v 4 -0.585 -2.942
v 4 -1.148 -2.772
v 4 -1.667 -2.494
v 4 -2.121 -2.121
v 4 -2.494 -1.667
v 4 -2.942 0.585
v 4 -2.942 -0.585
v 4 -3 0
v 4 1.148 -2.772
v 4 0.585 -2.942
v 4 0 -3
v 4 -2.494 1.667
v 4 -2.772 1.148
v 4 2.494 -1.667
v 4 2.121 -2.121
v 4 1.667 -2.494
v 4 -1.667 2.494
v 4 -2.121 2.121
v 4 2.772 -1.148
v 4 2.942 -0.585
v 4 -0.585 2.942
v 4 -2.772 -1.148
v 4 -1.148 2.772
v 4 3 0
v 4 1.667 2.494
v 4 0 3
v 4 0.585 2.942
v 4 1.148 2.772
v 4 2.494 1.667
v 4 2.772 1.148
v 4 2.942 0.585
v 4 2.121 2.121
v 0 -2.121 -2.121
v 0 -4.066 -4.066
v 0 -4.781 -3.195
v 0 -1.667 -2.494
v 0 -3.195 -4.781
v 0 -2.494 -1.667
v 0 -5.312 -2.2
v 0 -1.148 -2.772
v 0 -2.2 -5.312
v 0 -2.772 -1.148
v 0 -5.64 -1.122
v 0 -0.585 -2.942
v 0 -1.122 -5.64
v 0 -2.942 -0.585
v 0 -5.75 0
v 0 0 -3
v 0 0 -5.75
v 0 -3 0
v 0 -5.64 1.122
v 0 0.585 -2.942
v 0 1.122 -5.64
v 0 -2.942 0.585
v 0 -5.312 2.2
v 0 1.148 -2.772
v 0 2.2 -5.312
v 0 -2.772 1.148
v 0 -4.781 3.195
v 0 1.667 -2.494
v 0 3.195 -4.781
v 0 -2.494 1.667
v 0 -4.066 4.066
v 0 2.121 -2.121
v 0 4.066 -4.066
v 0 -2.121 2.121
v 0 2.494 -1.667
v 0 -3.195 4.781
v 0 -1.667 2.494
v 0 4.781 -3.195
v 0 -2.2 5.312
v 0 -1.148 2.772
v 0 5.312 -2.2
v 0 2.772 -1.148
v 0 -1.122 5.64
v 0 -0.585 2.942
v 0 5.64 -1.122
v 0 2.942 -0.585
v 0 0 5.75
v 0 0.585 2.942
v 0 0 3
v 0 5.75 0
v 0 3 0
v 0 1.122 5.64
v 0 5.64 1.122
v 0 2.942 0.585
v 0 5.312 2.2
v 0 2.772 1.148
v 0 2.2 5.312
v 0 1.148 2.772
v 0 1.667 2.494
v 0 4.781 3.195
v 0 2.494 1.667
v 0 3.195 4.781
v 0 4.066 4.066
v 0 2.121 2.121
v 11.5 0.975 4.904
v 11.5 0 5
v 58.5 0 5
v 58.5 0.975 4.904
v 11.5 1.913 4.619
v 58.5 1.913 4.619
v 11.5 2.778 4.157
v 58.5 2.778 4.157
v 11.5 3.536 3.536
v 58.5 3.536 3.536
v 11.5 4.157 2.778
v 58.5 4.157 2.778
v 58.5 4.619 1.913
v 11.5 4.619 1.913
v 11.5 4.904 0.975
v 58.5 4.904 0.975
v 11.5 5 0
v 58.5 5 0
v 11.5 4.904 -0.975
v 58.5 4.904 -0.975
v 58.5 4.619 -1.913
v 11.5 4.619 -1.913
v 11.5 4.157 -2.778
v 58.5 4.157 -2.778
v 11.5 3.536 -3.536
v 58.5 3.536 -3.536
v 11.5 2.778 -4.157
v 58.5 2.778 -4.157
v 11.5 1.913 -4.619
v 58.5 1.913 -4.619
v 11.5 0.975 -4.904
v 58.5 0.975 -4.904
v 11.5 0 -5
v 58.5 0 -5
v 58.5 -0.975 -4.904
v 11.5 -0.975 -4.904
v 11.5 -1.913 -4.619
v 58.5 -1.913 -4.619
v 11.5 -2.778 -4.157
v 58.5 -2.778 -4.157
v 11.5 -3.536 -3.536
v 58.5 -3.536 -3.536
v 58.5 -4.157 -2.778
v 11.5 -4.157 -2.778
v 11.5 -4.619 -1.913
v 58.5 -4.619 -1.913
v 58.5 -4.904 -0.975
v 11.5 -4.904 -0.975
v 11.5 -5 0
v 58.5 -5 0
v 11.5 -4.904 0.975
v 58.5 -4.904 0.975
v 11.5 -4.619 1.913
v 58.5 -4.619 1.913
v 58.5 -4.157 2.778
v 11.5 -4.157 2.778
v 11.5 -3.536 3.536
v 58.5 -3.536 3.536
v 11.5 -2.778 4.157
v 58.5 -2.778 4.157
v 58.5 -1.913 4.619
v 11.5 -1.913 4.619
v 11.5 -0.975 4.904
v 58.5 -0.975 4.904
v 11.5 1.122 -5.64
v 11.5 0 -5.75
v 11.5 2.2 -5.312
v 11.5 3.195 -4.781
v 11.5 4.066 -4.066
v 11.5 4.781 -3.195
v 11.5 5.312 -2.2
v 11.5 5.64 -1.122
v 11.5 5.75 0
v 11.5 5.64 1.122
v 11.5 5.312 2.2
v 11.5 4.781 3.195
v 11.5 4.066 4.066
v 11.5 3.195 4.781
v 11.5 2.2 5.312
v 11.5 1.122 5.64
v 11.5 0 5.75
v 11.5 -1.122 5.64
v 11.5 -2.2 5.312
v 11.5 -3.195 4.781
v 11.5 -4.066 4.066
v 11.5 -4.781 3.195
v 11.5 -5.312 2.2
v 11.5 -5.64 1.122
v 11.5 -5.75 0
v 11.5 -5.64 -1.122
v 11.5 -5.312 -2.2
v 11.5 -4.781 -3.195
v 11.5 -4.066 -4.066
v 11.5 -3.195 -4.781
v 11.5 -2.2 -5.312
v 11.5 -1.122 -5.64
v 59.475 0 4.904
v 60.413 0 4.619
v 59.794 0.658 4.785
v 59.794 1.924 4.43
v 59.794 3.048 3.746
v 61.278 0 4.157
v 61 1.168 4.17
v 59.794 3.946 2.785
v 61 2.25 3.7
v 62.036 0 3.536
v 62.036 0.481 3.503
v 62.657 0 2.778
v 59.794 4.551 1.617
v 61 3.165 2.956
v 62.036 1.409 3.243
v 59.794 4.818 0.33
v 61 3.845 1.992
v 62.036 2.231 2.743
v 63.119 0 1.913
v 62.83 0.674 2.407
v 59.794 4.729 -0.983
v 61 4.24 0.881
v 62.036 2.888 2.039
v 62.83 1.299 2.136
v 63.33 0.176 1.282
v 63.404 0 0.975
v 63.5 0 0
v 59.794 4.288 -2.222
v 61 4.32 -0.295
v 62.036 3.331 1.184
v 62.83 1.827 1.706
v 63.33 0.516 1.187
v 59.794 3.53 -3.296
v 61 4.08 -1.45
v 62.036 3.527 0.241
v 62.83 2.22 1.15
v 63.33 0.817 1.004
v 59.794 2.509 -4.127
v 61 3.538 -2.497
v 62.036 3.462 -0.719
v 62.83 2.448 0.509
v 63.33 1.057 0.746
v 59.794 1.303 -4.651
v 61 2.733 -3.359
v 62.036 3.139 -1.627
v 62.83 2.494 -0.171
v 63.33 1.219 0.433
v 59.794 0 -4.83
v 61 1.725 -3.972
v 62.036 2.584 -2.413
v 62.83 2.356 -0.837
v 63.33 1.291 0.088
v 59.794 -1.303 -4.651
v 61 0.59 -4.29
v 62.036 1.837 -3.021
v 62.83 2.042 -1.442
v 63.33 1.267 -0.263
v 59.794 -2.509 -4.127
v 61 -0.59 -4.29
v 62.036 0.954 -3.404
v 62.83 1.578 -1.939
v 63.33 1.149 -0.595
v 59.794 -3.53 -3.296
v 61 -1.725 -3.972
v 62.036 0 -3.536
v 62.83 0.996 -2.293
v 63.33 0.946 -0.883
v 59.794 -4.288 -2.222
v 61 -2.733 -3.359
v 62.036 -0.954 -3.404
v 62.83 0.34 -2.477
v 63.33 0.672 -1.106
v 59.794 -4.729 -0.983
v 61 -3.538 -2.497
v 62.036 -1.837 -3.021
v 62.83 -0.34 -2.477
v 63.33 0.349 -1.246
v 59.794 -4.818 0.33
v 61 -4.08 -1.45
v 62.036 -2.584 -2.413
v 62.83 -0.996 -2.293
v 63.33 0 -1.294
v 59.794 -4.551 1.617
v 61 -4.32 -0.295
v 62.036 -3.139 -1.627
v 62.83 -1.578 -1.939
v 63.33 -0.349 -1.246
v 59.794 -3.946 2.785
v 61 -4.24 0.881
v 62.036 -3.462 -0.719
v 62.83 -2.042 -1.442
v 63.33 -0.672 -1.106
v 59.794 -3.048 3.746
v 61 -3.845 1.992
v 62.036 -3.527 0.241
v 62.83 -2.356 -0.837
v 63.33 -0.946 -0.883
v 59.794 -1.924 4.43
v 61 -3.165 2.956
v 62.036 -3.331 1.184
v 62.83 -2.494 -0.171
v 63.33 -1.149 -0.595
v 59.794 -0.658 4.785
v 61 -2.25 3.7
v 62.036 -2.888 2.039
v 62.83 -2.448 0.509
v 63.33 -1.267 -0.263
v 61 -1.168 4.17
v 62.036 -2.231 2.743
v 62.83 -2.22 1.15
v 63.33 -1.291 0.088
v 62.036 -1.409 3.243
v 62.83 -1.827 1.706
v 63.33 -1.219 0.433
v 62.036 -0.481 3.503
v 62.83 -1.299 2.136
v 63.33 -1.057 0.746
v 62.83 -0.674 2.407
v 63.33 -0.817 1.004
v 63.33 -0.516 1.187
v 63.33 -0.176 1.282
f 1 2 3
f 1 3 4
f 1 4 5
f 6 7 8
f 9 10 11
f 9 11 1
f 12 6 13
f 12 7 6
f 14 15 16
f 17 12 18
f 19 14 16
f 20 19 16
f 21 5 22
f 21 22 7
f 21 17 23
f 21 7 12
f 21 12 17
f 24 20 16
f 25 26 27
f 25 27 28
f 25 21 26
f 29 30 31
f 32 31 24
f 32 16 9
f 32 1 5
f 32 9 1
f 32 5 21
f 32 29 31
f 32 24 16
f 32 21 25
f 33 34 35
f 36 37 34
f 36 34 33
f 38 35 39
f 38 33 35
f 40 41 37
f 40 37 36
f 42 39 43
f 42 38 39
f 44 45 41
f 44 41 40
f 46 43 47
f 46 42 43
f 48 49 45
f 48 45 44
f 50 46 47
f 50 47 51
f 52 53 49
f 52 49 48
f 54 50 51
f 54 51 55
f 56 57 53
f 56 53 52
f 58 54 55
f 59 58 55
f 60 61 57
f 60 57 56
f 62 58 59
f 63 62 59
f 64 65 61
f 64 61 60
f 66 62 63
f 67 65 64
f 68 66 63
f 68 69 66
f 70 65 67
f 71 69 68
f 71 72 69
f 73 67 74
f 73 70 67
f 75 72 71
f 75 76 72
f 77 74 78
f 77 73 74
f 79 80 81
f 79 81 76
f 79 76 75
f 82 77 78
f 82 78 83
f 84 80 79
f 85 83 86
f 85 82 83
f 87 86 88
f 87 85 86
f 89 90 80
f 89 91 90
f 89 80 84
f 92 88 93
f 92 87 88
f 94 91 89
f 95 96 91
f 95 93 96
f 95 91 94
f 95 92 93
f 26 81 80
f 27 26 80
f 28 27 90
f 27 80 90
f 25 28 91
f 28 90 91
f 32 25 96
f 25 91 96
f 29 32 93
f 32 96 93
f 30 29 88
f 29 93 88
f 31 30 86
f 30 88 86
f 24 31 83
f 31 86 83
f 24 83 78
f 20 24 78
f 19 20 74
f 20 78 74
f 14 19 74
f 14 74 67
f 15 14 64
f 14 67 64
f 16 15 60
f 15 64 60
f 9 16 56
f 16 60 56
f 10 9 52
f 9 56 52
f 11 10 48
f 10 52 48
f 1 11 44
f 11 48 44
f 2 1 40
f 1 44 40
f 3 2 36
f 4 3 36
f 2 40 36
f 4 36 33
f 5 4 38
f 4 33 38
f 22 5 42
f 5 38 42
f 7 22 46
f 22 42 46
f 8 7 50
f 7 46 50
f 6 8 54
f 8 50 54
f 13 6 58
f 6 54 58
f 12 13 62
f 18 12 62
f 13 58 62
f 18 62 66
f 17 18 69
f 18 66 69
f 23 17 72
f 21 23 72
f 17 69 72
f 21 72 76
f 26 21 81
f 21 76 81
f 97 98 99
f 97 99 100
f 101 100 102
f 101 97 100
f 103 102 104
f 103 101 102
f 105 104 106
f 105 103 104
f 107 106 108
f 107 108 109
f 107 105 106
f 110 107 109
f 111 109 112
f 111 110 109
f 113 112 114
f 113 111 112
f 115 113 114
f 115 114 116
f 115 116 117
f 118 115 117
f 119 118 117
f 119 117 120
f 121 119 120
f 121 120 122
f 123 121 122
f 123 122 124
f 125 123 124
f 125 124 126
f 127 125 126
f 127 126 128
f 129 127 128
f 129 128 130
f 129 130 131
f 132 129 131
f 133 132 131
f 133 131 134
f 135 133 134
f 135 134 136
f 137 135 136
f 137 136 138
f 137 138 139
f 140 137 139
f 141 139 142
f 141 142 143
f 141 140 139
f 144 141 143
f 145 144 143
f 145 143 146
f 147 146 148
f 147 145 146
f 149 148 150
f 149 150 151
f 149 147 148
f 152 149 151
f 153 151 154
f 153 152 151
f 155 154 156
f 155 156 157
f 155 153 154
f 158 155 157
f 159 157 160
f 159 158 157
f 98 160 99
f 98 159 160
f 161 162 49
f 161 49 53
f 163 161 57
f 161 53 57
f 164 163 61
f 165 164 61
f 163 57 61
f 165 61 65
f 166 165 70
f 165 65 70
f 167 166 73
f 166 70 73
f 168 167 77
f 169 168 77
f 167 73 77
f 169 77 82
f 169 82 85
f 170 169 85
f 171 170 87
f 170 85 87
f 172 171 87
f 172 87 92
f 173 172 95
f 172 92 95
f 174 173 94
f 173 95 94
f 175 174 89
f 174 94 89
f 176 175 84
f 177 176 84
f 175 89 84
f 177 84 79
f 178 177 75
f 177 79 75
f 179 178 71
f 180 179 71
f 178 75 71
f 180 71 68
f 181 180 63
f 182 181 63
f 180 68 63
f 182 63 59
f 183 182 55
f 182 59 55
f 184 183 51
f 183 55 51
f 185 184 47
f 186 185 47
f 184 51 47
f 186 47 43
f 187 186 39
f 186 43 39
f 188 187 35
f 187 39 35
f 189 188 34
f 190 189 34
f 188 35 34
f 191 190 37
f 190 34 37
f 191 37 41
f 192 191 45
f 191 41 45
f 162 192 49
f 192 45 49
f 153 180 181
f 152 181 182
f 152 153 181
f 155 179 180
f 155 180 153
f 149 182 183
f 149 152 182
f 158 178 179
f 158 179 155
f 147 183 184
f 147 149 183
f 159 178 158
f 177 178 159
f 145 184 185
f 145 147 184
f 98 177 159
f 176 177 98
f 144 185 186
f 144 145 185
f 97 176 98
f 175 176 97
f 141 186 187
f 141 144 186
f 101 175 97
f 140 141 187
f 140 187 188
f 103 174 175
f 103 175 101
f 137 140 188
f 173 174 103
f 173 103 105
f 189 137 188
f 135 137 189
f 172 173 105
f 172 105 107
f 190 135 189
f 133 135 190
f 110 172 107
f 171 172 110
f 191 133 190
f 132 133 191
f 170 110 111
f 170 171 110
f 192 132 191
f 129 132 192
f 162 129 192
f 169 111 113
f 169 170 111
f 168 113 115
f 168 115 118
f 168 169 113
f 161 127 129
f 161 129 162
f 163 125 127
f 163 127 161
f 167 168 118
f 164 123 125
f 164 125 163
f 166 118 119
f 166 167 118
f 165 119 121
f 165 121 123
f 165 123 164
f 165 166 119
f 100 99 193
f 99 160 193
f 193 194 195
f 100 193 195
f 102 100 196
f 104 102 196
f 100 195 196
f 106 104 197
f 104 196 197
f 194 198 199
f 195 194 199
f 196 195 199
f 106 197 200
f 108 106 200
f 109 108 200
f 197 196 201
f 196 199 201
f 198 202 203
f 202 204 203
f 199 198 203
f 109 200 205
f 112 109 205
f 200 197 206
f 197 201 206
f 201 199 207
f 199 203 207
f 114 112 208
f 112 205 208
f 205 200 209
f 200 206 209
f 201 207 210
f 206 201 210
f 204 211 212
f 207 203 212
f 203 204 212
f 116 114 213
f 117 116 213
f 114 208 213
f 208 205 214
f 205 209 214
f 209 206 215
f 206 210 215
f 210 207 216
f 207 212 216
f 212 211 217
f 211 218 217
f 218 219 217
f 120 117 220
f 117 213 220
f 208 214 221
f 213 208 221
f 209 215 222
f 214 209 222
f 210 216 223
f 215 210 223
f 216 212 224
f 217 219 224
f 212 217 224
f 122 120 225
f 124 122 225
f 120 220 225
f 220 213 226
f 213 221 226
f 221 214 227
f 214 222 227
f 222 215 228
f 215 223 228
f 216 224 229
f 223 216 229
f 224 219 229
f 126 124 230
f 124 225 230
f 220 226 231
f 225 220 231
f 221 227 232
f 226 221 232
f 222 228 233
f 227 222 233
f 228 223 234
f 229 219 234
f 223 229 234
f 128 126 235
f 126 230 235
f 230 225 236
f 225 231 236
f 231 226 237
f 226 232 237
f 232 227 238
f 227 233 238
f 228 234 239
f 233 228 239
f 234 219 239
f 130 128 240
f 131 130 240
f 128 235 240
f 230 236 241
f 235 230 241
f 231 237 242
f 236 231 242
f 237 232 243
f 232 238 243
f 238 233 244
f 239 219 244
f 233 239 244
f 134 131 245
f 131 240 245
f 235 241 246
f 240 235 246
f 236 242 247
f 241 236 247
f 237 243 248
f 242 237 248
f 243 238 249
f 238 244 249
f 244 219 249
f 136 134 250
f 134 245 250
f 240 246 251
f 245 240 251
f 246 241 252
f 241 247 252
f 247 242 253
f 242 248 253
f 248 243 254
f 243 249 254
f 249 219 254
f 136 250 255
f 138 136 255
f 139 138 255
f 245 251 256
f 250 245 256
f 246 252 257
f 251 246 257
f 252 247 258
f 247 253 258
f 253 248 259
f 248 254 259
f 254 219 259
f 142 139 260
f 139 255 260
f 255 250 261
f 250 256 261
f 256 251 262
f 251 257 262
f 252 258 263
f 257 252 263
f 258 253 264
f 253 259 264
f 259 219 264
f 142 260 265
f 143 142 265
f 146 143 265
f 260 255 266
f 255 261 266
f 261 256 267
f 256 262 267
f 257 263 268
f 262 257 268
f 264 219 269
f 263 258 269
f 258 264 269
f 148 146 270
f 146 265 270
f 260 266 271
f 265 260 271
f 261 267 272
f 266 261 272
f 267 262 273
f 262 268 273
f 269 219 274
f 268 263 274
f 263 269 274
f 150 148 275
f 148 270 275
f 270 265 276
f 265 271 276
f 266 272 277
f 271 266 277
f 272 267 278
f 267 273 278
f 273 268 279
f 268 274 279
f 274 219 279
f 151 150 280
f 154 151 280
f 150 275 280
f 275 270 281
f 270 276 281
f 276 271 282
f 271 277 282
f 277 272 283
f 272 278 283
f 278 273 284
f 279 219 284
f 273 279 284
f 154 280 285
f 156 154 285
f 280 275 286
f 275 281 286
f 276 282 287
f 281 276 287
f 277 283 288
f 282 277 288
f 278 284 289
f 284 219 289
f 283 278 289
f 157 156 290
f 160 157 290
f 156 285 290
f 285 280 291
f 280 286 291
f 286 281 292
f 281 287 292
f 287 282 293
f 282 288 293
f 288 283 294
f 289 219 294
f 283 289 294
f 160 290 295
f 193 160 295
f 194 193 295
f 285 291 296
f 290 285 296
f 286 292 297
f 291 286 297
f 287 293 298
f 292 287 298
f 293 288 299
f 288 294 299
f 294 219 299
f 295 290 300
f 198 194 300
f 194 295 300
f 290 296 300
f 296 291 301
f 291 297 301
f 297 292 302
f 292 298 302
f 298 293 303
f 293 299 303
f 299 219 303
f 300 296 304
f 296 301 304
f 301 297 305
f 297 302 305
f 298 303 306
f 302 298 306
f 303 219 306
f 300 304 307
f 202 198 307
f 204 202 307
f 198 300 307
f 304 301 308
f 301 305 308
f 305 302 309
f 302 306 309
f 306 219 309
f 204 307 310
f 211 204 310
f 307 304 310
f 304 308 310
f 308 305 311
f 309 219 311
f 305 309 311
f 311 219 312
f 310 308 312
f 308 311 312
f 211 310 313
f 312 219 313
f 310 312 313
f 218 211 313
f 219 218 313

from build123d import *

# Parameters (mm, degrees)
SKETCH_1_R          = 5.75
EXTRUDE_1_DEPTH     = 11.5
SKETCH_3_R          = 5
EXTRUDE_2_DEPTH     = 63.5
FILLET_1_R          = 5
SKETCH_4_R          = 3
CUT_EXTRUDE_1_DEPTH = 4


with BuildPart() as part:
    # 草图1 → 凸台-拉伸1 (new body)
    with BuildSketch(Plane(origin=(0, 0, 0), x_dir=(0, 0, -1), z_dir=(1, 0, 0))):
        Circle(SKETCH_1_R)
    extrude(amount=EXTRUDE_1_DEPTH)

    # 草图3 → 凸台-拉伸2 (add)
    with BuildSketch(Plane.ZY):
        Circle(SKETCH_3_R)
    extrude(amount=-EXTRUDE_2_DEPTH)

    # 圆角1
    fillet_1_edges = [part.edges().sort_by_distance(p)[0] for p in [
        (63.5, 0, -5),
    ]]
    fillet(fillet_1_edges, radius=FILLET_1_R)

    # 草图4 → 切除-拉伸1 (cut)
    with BuildSketch(Plane.ZY):
        Circle(SKETCH_4_R)
    extrude(amount=-CUT_EXTRUDE_1_DEPTH, mode=Mode.SUBTRACT)


solid = part.part
